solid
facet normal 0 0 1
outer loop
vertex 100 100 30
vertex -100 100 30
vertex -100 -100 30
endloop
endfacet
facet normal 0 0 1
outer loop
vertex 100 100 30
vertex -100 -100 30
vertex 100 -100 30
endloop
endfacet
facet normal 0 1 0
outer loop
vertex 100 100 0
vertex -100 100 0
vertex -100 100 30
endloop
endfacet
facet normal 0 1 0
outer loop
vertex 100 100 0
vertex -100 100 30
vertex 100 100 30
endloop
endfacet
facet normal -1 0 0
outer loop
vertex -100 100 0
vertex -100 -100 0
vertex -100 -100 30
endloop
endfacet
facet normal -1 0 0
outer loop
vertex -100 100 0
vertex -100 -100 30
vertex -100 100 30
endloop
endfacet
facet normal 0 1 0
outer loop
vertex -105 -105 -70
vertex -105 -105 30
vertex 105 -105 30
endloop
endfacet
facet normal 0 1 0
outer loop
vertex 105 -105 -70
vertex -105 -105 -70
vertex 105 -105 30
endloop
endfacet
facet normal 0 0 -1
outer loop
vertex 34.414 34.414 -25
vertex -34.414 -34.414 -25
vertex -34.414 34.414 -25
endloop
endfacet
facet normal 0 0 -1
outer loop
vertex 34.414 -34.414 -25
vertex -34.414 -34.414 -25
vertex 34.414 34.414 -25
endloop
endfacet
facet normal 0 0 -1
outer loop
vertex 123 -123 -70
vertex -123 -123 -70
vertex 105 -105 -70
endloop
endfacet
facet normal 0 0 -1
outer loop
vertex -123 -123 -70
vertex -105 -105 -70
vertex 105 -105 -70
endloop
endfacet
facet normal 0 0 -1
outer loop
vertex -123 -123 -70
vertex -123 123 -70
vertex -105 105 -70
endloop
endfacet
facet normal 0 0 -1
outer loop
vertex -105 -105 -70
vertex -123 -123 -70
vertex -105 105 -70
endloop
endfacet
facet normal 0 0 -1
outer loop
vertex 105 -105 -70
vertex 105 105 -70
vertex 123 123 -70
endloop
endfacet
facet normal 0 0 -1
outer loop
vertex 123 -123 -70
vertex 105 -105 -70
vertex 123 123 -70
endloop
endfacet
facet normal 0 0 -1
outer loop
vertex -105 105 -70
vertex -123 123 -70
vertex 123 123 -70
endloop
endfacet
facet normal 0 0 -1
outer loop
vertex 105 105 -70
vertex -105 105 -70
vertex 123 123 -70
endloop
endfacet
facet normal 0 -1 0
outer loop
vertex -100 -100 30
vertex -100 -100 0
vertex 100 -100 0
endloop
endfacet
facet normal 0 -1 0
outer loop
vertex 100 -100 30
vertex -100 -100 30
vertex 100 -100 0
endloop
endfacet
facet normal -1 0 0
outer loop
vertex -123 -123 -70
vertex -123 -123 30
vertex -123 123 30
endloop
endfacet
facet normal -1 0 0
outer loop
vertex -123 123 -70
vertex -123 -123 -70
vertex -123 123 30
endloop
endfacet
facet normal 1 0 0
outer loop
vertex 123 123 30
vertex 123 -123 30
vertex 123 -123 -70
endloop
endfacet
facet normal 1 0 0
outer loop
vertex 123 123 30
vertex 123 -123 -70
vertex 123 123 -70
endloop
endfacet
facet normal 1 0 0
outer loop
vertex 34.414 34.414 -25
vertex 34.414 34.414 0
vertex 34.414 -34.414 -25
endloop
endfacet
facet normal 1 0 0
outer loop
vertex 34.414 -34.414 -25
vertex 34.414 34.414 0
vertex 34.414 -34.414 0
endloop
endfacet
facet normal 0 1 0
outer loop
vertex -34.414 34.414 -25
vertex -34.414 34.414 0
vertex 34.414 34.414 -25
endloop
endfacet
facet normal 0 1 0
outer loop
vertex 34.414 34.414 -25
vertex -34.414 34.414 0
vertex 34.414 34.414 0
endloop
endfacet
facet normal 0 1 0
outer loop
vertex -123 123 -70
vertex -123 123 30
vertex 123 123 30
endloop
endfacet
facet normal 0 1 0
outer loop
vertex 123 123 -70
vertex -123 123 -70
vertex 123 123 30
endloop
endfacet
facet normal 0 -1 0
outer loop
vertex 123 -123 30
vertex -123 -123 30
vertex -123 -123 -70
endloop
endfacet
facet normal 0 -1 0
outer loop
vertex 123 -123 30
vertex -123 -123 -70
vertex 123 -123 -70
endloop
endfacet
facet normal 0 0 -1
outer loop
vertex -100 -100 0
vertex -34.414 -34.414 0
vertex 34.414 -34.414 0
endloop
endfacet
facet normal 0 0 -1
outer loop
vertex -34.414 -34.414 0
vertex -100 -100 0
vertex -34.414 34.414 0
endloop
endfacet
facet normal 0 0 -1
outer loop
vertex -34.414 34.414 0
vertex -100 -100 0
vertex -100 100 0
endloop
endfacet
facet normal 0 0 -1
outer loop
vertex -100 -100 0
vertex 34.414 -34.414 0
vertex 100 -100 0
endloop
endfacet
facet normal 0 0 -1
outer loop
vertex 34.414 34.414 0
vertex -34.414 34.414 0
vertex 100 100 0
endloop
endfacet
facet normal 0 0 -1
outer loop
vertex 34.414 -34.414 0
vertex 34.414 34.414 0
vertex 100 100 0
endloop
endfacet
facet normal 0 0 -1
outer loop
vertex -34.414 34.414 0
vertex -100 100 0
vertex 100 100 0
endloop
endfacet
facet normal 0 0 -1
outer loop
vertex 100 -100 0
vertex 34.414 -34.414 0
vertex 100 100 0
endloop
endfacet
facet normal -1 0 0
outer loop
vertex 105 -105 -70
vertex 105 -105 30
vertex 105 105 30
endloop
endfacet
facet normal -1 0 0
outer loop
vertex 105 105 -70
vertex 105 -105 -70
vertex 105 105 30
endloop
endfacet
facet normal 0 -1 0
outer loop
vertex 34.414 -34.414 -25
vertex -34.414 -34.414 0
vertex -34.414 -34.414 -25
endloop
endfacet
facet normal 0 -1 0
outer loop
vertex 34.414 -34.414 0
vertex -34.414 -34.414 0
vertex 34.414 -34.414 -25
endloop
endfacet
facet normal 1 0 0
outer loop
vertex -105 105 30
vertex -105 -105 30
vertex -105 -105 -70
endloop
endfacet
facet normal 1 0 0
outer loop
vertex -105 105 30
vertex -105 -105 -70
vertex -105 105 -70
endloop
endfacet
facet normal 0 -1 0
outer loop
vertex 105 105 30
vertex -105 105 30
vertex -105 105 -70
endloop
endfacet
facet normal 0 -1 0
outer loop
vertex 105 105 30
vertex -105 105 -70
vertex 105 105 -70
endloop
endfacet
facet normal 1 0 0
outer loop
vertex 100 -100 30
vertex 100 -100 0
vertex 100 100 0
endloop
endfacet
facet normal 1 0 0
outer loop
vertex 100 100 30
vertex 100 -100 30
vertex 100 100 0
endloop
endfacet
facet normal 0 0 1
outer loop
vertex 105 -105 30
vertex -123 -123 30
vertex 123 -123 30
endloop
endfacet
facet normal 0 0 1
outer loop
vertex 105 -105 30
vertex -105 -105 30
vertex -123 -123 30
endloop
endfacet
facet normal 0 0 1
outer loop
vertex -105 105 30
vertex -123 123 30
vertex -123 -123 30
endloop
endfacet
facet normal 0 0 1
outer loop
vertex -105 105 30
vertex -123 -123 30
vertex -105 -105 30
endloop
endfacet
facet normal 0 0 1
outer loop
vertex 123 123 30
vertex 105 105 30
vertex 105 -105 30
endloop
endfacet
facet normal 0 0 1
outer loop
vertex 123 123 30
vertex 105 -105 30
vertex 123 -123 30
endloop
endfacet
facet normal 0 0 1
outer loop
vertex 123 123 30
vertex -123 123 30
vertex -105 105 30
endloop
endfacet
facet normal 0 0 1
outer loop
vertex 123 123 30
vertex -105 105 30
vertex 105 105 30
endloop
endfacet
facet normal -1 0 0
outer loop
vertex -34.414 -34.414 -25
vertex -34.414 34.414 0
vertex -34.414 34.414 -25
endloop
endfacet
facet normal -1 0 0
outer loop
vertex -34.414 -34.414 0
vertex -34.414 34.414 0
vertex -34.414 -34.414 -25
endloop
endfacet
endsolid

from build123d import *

# Parameters (mm, degrees)
F0_W     = 200
F0_H     = 200
F1_DEPTH = 30
F2_W     = 246
F2_H     = 246
F2_W_2   = 210
F2_H_2   = 210
F3_DEPTH = 100
F4_W     = 68.82748
F4_H     = 68.82748
F5_DEPTH = 25


with BuildPart() as f1:
    # F0 (on Top) → F1 (new body)
    with BuildSketch(Plane.XY):
        Rectangle(F0_W, F0_H)
    extrude(amount=F1_DEPTH)

    # F4 (on face) → F5 (join)
    with BuildSketch(Plane(origin=(0, 0, 0), x_dir=(1, 0, 0), z_dir=(0, 0, -1))):
        Rectangle(F4_W, F4_H)
    extrude(amount=F5_DEPTH)


with BuildPart() as f3:
    # F2 (on face) → F3 (new body)
    with BuildSketch(Plane.XY.offset(30)):
        Rectangle(F2_W, F2_H)
        Rectangle(F2_W_2, F2_H_2, mode=Mode.SUBTRACT)
    extrude(amount=-F3_DEPTH)


solid = Compound([f1.part, f3.part])
